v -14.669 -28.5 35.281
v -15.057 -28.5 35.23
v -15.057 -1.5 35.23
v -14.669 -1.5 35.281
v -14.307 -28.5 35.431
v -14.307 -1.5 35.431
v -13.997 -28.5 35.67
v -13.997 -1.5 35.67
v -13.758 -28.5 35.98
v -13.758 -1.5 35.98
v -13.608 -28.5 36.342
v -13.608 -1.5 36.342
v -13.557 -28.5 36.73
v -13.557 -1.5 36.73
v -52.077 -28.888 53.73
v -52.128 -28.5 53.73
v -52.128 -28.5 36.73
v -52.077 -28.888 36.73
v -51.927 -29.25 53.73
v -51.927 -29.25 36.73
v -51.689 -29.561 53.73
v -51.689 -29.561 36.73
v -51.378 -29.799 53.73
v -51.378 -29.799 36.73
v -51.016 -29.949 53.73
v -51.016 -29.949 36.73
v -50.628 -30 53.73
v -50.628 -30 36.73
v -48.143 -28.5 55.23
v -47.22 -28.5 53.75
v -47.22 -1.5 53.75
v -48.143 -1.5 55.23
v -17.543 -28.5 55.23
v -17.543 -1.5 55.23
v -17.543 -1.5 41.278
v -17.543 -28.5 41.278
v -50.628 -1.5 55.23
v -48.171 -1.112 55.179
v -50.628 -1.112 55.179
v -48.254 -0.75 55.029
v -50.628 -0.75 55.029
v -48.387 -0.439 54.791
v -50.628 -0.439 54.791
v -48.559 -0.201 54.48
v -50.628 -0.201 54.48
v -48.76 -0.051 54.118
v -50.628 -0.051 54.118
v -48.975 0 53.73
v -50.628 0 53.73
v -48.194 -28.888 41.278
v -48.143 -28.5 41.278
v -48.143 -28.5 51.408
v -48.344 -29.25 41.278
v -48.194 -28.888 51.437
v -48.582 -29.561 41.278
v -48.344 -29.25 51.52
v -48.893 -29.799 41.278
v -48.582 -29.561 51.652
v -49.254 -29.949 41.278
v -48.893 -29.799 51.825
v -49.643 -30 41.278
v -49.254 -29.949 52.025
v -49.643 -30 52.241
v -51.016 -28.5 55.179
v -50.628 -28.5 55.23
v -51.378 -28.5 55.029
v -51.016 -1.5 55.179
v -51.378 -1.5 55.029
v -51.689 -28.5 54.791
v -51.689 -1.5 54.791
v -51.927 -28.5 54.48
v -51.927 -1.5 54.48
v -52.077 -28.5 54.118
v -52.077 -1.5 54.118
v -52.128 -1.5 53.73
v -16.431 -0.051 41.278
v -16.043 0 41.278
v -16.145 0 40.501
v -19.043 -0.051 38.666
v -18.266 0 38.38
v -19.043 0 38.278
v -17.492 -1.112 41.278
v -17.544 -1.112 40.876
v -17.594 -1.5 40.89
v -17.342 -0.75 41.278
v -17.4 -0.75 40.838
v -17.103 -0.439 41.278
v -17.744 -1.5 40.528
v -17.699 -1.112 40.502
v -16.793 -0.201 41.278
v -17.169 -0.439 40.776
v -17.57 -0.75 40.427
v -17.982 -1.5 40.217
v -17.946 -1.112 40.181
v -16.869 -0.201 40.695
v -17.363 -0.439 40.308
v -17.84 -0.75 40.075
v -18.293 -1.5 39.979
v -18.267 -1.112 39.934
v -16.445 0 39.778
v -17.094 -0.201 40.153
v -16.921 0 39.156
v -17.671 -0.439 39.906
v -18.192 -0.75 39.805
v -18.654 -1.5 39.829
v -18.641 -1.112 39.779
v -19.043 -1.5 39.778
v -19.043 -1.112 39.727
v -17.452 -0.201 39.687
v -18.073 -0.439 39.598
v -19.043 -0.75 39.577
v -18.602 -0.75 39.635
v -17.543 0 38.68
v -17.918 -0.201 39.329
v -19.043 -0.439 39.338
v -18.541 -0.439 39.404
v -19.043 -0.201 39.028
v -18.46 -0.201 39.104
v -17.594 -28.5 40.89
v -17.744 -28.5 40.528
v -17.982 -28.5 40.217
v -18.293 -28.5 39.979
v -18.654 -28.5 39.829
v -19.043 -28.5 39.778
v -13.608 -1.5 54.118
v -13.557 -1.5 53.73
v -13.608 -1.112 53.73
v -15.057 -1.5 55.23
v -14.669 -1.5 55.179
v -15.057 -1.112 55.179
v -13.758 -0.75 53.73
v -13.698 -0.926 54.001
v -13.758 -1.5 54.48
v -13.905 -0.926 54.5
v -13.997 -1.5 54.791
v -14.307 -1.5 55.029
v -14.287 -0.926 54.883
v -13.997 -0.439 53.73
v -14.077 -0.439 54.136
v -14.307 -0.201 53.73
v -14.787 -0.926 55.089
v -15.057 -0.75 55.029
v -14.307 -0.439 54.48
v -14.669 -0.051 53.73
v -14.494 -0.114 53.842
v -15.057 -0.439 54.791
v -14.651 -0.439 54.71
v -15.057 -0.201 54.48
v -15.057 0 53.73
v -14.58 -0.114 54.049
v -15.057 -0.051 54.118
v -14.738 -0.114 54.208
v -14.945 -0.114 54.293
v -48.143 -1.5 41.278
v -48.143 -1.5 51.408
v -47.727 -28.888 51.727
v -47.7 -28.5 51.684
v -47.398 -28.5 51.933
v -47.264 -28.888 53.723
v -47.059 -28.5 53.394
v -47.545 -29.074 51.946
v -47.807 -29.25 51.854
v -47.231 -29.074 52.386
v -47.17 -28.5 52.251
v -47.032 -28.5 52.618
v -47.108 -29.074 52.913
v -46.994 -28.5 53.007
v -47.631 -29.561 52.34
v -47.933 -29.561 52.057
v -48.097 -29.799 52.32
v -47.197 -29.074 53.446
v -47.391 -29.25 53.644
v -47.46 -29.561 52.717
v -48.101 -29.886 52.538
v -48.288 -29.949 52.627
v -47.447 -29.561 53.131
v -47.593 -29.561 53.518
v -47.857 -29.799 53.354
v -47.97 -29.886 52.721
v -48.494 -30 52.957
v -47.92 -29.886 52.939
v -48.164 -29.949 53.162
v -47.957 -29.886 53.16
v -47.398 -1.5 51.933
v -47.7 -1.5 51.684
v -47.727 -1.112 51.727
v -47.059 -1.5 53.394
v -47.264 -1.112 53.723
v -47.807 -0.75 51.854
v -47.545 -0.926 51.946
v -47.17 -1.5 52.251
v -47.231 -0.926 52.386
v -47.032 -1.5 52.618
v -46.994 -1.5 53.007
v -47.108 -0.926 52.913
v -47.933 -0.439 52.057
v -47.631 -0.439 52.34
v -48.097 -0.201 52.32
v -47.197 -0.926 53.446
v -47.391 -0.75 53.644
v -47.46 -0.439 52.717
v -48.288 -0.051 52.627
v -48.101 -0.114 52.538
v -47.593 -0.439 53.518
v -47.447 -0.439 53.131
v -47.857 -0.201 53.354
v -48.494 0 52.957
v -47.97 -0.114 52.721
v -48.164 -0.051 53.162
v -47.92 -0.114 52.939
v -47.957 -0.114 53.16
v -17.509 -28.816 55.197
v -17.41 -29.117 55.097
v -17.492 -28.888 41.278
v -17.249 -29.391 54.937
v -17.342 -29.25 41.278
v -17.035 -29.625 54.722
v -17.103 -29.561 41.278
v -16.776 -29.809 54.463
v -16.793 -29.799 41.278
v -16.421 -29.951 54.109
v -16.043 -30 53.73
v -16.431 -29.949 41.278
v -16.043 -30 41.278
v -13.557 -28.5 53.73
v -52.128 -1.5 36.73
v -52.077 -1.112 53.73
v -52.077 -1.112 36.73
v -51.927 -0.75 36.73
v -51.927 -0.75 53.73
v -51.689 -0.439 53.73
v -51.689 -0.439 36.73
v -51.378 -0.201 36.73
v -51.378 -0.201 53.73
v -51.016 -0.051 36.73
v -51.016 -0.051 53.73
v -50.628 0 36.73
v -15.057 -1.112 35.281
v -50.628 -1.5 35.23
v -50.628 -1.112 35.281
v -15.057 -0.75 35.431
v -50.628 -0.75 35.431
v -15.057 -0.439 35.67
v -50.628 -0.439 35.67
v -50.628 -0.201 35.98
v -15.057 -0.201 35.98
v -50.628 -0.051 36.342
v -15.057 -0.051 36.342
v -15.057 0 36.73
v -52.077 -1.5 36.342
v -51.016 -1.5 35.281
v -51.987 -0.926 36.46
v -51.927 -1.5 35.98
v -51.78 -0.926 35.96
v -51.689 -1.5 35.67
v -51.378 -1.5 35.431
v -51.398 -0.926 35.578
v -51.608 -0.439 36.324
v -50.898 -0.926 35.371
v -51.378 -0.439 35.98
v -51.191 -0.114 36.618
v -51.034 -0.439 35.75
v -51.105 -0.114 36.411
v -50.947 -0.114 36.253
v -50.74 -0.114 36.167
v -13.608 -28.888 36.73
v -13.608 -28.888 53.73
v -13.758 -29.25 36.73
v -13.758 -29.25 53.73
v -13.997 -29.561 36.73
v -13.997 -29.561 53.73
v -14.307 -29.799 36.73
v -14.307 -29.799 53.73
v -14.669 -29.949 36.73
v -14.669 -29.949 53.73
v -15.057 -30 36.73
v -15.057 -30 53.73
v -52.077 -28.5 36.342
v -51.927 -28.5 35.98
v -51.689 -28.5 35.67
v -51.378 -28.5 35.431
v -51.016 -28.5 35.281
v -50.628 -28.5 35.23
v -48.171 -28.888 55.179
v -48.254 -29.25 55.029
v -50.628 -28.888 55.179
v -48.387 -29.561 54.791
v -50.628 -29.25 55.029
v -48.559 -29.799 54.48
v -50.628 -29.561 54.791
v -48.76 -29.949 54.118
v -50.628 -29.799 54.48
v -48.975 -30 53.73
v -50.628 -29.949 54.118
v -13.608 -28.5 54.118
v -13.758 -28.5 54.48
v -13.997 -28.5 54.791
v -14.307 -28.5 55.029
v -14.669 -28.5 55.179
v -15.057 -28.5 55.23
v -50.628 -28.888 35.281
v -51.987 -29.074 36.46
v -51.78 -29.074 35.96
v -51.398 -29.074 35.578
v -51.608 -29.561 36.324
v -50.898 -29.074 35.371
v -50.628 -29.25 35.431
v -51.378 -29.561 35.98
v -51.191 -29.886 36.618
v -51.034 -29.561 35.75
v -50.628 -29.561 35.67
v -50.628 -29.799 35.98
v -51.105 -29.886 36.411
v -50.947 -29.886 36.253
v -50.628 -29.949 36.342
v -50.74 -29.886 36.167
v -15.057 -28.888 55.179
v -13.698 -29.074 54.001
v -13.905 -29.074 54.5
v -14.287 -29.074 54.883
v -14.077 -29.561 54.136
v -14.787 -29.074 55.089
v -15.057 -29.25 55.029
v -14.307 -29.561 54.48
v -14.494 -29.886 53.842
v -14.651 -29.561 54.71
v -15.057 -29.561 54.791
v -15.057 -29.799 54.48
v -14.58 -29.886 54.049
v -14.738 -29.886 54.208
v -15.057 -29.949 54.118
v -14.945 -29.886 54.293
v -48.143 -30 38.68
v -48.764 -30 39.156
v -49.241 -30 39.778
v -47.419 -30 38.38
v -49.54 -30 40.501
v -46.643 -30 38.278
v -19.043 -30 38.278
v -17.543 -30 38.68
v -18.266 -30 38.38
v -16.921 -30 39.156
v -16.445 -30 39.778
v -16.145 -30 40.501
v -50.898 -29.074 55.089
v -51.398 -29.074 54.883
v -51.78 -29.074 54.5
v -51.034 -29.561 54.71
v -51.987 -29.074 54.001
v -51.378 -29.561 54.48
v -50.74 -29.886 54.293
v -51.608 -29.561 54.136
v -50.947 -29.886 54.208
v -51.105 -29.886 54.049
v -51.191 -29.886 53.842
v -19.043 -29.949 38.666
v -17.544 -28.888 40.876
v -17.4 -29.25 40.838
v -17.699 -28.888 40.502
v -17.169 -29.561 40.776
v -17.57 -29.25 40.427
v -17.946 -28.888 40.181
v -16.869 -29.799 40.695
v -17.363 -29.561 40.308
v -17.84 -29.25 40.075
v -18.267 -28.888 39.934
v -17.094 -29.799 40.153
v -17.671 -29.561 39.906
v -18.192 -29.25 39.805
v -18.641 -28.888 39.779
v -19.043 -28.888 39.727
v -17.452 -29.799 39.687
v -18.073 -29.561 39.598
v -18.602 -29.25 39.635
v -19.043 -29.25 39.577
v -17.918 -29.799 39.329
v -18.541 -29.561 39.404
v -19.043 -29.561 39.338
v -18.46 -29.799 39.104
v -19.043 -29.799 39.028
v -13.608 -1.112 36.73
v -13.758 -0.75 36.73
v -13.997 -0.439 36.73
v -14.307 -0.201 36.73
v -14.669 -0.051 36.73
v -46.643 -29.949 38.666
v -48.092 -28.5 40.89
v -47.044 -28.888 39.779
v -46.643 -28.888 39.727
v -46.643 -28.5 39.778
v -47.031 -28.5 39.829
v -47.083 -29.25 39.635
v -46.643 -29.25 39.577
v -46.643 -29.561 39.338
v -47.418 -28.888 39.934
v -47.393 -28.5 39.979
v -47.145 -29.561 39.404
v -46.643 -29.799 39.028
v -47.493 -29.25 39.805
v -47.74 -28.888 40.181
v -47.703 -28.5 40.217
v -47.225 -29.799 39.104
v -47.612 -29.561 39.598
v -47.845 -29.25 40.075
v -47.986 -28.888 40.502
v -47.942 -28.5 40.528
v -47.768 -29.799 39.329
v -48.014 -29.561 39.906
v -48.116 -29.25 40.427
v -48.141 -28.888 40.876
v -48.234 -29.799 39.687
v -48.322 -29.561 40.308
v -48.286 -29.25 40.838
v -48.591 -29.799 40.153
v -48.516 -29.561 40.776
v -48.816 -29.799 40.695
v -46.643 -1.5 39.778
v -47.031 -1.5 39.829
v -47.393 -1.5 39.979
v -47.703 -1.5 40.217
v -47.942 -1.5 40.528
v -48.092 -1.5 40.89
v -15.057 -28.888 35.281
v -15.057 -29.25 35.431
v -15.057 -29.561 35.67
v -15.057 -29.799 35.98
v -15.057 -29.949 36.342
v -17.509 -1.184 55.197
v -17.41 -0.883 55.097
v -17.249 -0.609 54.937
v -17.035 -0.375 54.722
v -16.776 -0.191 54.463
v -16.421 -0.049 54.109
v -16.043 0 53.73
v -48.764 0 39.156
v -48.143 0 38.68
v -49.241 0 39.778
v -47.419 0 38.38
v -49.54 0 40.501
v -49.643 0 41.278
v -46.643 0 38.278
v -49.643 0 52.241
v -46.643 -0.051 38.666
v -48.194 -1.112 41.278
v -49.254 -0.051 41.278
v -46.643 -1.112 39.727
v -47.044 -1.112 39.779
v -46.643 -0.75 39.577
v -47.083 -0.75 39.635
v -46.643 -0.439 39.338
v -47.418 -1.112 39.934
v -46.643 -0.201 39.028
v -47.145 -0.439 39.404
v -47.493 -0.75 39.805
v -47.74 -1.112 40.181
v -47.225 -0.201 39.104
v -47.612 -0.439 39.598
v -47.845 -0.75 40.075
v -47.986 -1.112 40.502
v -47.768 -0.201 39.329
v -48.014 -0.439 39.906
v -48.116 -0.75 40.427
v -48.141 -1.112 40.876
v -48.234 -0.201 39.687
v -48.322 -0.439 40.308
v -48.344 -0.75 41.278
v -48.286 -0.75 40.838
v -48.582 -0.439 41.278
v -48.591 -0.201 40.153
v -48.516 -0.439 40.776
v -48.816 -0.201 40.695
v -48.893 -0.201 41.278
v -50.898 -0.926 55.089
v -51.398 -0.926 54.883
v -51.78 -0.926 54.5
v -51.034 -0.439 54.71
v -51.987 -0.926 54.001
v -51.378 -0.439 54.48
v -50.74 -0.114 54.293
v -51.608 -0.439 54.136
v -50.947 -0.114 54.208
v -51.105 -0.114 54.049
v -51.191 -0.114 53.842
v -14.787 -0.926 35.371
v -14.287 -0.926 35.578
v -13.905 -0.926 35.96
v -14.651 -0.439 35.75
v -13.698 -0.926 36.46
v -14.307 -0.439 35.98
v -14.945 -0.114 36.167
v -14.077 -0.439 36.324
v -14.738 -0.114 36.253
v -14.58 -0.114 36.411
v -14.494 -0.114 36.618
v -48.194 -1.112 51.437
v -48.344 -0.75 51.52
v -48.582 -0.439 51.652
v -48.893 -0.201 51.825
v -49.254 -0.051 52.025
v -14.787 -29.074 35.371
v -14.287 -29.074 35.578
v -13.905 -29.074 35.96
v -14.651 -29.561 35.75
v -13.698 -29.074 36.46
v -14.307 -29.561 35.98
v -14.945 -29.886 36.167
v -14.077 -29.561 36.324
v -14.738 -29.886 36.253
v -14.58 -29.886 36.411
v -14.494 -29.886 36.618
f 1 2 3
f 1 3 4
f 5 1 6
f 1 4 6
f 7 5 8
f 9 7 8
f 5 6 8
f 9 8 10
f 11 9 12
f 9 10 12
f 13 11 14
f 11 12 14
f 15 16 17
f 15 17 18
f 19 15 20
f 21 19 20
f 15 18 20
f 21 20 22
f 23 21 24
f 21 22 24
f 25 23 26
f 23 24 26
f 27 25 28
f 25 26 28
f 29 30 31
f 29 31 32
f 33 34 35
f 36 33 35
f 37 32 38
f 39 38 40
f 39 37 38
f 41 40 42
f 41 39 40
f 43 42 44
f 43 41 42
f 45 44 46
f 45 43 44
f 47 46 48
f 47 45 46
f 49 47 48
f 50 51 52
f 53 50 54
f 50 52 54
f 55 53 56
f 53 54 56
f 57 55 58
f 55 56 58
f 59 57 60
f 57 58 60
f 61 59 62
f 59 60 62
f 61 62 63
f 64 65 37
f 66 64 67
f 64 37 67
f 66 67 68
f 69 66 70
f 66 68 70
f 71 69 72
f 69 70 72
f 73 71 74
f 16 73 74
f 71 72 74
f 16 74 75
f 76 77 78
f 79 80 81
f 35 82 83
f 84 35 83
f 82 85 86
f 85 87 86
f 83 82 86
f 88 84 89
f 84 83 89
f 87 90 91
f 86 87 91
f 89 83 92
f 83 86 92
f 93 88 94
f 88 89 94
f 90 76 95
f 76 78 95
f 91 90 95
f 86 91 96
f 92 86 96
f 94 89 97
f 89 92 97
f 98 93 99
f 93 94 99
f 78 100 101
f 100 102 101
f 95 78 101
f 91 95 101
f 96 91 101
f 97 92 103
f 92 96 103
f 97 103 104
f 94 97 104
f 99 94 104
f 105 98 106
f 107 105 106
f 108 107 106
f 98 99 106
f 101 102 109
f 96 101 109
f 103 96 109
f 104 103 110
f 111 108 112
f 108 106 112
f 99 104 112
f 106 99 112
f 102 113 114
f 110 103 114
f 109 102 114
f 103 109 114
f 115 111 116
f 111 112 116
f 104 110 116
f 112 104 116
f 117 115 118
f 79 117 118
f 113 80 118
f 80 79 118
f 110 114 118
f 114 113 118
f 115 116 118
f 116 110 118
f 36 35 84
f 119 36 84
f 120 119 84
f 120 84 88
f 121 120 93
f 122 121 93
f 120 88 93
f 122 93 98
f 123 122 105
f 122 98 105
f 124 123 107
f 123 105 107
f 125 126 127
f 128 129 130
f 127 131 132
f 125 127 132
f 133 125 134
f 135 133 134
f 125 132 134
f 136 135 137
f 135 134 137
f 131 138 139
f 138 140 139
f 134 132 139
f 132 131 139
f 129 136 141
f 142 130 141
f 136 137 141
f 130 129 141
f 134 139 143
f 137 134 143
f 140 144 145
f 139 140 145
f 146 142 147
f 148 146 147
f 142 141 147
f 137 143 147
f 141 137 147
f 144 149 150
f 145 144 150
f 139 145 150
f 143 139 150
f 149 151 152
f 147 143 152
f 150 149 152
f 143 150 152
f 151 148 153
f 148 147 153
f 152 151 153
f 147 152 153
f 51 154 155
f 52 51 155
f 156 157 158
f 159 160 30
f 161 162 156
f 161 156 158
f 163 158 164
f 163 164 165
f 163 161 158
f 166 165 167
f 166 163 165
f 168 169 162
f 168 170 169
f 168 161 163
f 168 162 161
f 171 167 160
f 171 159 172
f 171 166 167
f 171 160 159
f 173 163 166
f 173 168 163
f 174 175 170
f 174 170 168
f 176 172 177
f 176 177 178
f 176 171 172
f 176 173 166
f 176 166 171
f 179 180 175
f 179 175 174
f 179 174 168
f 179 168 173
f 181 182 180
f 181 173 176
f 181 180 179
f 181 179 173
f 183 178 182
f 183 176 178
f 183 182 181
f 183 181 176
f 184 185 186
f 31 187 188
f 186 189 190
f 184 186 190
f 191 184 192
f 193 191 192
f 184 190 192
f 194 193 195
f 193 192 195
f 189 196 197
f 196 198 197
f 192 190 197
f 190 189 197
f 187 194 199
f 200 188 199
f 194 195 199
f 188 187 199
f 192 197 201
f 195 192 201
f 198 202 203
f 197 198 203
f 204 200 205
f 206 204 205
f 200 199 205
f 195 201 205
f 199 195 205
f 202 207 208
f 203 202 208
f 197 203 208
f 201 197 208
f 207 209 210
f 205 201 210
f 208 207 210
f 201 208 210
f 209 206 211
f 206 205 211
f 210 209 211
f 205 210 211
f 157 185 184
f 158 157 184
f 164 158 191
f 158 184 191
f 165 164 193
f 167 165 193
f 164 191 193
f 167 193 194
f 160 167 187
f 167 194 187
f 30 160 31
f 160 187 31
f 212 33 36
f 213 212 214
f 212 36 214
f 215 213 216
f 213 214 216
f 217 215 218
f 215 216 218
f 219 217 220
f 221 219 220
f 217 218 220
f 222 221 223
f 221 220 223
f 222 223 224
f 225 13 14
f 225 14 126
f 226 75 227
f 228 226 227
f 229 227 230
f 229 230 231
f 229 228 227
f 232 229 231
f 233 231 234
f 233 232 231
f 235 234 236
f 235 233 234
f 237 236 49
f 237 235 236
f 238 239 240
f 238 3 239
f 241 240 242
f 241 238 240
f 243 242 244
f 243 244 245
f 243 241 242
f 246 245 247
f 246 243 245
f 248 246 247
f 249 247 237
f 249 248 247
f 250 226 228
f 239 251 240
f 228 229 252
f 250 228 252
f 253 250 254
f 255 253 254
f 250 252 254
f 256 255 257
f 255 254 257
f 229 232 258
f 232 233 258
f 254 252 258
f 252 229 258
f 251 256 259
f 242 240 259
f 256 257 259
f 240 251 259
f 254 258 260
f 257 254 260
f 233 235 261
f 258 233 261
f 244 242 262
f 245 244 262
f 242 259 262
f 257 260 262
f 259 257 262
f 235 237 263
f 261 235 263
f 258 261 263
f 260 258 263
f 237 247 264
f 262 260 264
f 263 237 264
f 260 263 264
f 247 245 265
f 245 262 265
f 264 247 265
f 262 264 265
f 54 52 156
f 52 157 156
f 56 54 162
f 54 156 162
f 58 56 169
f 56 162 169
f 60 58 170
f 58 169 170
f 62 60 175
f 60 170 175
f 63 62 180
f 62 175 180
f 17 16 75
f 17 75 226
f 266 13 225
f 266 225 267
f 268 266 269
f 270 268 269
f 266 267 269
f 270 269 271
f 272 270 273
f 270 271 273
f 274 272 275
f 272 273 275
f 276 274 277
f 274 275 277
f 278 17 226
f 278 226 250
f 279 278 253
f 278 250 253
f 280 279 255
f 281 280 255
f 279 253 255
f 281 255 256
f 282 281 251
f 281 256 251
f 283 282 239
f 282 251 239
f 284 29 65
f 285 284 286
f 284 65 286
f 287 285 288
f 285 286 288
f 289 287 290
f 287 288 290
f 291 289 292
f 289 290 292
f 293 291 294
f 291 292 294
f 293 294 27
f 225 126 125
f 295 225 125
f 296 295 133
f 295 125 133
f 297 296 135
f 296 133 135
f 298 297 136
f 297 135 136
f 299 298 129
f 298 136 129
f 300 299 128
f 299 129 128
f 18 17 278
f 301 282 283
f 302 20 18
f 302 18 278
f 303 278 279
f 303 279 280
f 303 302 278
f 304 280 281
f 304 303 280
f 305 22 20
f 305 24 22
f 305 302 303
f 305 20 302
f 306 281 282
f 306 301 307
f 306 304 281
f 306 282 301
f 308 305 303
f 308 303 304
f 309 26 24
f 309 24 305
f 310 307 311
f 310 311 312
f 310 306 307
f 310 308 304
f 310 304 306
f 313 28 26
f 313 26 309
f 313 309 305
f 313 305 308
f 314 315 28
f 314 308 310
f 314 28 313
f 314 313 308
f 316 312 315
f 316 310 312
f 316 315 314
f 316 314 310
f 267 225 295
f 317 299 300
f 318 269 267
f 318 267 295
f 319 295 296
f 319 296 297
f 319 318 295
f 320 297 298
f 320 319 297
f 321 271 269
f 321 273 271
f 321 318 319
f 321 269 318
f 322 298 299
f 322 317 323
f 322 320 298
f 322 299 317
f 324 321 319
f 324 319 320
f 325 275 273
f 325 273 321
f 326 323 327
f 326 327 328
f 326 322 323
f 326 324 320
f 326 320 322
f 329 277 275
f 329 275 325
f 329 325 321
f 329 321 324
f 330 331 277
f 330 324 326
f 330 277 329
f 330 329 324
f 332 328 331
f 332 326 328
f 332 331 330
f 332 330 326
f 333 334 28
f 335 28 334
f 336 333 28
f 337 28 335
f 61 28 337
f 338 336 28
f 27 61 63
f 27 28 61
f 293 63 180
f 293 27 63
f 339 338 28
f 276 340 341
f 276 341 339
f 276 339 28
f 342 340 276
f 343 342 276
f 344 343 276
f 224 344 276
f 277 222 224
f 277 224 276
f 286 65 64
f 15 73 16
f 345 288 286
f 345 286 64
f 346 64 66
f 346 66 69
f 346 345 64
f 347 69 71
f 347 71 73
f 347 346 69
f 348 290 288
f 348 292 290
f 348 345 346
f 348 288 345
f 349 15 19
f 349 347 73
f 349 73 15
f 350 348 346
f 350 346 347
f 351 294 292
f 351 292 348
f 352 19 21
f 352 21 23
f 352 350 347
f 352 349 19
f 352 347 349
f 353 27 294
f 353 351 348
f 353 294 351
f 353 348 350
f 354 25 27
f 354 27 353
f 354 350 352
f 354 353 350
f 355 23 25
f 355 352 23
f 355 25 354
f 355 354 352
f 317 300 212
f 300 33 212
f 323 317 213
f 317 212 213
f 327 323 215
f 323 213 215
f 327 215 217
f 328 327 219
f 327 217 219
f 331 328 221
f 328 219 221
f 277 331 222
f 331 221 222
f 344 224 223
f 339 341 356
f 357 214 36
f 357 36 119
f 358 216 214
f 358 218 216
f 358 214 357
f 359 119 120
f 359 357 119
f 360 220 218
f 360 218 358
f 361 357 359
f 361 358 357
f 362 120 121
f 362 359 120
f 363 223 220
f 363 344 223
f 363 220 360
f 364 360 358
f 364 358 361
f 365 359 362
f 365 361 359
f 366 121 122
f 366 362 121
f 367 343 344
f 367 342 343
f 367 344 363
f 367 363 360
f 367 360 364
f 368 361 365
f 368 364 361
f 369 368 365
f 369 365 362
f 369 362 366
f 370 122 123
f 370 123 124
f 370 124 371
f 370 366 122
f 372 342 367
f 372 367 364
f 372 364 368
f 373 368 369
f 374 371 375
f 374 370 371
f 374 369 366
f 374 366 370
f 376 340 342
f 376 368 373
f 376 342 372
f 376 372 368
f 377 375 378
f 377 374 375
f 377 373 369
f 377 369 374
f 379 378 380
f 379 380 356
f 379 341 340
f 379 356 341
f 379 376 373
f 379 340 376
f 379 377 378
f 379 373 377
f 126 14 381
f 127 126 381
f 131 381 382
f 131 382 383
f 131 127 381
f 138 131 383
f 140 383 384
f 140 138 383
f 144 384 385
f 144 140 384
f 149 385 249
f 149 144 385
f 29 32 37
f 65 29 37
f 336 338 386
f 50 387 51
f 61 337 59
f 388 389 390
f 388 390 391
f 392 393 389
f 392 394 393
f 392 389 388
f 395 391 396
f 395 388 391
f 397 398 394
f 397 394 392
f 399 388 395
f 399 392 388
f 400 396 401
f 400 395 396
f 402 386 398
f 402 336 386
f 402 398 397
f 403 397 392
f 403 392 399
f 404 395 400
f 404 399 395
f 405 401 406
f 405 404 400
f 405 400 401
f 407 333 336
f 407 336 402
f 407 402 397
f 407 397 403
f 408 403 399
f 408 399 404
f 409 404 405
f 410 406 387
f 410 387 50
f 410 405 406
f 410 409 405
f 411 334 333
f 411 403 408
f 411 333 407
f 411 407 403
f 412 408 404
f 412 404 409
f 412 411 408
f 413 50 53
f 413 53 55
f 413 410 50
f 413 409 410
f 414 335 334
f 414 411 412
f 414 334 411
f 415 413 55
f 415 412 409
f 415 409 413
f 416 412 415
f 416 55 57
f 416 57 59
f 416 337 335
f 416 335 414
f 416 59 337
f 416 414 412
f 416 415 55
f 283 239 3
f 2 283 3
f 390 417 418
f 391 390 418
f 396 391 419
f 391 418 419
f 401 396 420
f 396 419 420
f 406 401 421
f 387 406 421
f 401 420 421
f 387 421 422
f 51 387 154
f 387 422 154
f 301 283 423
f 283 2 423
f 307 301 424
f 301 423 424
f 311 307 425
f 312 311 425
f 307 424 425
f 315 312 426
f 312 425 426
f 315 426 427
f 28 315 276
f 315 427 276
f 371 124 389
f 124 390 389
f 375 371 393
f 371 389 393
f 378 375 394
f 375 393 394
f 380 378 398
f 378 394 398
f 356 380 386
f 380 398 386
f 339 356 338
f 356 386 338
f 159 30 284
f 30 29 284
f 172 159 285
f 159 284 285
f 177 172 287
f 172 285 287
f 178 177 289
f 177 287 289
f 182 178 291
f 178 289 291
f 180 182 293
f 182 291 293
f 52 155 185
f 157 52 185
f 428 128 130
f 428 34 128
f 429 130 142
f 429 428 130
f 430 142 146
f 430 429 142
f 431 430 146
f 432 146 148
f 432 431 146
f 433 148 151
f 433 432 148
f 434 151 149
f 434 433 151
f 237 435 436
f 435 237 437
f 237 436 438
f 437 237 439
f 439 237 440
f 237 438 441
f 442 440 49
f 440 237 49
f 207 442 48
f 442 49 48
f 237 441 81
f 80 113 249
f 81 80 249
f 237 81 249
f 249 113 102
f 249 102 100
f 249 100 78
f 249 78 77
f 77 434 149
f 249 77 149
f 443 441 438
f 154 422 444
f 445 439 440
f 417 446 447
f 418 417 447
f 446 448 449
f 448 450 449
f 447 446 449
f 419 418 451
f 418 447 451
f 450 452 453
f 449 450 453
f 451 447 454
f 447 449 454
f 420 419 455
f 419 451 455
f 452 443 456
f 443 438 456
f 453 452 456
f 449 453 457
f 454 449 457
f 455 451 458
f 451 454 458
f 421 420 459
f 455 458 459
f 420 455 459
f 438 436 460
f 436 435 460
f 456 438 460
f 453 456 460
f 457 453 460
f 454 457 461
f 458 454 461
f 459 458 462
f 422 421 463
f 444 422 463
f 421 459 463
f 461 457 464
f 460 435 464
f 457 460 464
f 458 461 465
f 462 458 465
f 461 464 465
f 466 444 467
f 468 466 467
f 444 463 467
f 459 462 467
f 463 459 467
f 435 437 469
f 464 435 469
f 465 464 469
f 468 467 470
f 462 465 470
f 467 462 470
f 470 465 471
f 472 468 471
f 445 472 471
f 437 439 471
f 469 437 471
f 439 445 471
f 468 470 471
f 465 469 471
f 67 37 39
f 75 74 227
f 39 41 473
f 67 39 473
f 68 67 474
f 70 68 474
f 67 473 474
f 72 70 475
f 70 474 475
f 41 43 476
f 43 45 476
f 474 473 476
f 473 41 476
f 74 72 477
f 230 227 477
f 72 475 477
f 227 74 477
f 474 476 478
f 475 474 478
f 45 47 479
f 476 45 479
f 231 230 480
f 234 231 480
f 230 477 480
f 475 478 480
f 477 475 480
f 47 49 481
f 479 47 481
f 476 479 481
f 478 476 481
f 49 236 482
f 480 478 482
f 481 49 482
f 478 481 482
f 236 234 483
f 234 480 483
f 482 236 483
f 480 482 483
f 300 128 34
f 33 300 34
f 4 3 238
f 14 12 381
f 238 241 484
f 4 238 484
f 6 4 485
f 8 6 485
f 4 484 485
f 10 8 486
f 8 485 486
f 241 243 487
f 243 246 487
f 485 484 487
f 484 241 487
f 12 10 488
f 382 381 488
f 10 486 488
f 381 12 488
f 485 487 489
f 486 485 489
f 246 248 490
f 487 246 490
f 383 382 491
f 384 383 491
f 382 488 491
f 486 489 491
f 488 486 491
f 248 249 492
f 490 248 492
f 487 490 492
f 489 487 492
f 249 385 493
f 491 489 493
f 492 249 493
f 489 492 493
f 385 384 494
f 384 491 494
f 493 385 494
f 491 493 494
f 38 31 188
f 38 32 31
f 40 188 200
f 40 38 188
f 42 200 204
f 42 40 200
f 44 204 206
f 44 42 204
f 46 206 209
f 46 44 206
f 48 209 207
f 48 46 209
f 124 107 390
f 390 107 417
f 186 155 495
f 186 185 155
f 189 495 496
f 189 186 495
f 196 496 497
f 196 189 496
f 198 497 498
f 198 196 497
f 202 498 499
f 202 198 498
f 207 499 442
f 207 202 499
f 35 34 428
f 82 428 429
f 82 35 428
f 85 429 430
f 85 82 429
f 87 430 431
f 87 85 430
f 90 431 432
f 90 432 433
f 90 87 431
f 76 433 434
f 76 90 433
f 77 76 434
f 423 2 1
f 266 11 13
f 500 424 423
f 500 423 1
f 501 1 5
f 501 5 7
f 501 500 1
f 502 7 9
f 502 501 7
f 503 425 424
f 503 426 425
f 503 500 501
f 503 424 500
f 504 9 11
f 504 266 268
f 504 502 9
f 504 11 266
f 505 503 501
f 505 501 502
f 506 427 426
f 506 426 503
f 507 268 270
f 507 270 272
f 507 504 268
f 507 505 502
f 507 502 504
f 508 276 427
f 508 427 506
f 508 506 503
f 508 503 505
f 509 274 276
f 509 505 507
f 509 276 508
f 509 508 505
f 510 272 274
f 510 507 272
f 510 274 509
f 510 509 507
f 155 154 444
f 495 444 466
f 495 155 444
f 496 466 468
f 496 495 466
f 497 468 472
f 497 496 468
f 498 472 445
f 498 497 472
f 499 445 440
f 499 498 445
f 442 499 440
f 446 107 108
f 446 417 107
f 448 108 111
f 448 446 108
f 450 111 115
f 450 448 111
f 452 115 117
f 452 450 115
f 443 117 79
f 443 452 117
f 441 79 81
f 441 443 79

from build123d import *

# Parameters (mm, degrees)
F1_DEPTH = 30
F2_R     = 1.5


# Not quite as in the source:
# - a feature names something its author has since deleted; it is built from what else it names


with BuildPart() as f1:
    # F0 (on Front) → F1 (new body)
    with BuildSketch(Plane.XZ):
        with BuildLine():
            ThreePointArc((-50.6280393004, 55.2302640676), (-51.6886994722, 54.7909242394), (-52.1280393004, 53.7302640676))
            Line((-52.1280393004, 53.7302640676), (-52.1280393004, 36.7302640676))
            ThreePointArc((-52.1280393004, 36.7302640676), (-51.6886994722, 35.6696038959), (-50.6280393004, 35.2302640676))
            Line((-50.6280393004, 35.2302640676), (-15.0573858261, 35.2302640676))
            ThreePointArc((-15.0573858261, 35.2302640676), (-13.9967256543, 35.6696038959), (-13.5573858261, 36.7302640676))
            Line((-13.5573858261, 36.7302640676), (-13.5573858261, 53.7302640676))
            ThreePointArc((-13.5573858261, 53.7302640676), (-13.9967256543, 54.7909242394), (-15.0573858261, 55.2302640676))
            Line((-15.0573858261, 55.2302640676), (-17.5427125633, 55.2302640676))
            Line((-17.5427125633, 55.2302640676), (-17.5427125633, 41.2777487338))
            ThreePointArc((-17.5427125633, 41.2777487338), (-17.9820523915, 40.217088562), (-19.0427125633, 39.7777487338))
            Line((-19.0427125633, 39.7777487338), (-46.6427125633, 39.7777487338))
            ThreePointArc((-46.6427125633, 39.7777487338), (-47.7033727351, 40.217088562), (-48.1427125633, 41.2777487338))
            Line((-48.1427125633, 41.2777487338), (-48.1427125633, 51.408215398))
            Line((-48.1427125633, 51.408215398), (-47.7003021707, 51.6838852273))
            ThreePointArc((-47.7003021707, 51.6838852273), (-47.032442186, 52.6176852731), (-47.2204902066, 53.7502299418))
            Line((-47.2204902066, 53.7502299418), (-48.1427125633, 55.2302640676))
            Line((-48.1427125633, 55.2302640676), (-50.6280393004, 55.2302640676))
        make_face()
    extrude(amount=F1_DEPTH)

    # F2
    f2_edges = [f1.edges().sort_by_distance(p)[0] for p in [
        (-49.385376, -30, 55.230264),
        (-51.688699, -30, 54.790924),
        (-52.128039, -30, 45.230264),
        (-51.688699, -30, 35.669604),
        (-32.842713, -30, 35.230264),
        (-13.996726, -30, 35.669604),
        (-13.557386, -30, 45.230264),
        (-13.996726, -30, 54.790924),
        (-16.300049, -30, 55.230264),
        (-17.542713, -30, 48.254006),
        (-17.982052, -30, 40.217089),
        (-32.842713, -30, 39.777749),
        (-47.703373, -30, 40.217089),
        (-48.142713, -30, 46.342982),
        (-47.921507, -30, 51.54605),
        (-47.032442, -30, 52.617685),
        (-47.681601, -30, 54.490247),
        (-49.385376, 0, 55.230264),
        (-51.688699, 0, 54.790924),
        (-52.128039, 0, 45.230264),
        (-51.688699, 0, 35.669604),
        (-32.842713, 0, 35.230264),
        (-13.996726, 0, 35.669604),
        (-13.557386, 0, 45.230264),
        (-13.996726, 0, 54.790924),
        (-16.300049, 0, 55.230264),
        (-17.542713, 0, 48.254006),
        (-17.982052, 0, 40.217089),
        (-32.842713, 0, 39.777749),
        (-47.703373, 0, 40.217089),
        (-48.142713, 0, 46.342982),
        (-47.921507, 0, 51.54605),
        (-47.032442, 0, 52.617685),
        (-47.681601, 0, 54.490247),
    ]]
    fillet(f2_edges, radius=F2_R)


solid = f1.part
